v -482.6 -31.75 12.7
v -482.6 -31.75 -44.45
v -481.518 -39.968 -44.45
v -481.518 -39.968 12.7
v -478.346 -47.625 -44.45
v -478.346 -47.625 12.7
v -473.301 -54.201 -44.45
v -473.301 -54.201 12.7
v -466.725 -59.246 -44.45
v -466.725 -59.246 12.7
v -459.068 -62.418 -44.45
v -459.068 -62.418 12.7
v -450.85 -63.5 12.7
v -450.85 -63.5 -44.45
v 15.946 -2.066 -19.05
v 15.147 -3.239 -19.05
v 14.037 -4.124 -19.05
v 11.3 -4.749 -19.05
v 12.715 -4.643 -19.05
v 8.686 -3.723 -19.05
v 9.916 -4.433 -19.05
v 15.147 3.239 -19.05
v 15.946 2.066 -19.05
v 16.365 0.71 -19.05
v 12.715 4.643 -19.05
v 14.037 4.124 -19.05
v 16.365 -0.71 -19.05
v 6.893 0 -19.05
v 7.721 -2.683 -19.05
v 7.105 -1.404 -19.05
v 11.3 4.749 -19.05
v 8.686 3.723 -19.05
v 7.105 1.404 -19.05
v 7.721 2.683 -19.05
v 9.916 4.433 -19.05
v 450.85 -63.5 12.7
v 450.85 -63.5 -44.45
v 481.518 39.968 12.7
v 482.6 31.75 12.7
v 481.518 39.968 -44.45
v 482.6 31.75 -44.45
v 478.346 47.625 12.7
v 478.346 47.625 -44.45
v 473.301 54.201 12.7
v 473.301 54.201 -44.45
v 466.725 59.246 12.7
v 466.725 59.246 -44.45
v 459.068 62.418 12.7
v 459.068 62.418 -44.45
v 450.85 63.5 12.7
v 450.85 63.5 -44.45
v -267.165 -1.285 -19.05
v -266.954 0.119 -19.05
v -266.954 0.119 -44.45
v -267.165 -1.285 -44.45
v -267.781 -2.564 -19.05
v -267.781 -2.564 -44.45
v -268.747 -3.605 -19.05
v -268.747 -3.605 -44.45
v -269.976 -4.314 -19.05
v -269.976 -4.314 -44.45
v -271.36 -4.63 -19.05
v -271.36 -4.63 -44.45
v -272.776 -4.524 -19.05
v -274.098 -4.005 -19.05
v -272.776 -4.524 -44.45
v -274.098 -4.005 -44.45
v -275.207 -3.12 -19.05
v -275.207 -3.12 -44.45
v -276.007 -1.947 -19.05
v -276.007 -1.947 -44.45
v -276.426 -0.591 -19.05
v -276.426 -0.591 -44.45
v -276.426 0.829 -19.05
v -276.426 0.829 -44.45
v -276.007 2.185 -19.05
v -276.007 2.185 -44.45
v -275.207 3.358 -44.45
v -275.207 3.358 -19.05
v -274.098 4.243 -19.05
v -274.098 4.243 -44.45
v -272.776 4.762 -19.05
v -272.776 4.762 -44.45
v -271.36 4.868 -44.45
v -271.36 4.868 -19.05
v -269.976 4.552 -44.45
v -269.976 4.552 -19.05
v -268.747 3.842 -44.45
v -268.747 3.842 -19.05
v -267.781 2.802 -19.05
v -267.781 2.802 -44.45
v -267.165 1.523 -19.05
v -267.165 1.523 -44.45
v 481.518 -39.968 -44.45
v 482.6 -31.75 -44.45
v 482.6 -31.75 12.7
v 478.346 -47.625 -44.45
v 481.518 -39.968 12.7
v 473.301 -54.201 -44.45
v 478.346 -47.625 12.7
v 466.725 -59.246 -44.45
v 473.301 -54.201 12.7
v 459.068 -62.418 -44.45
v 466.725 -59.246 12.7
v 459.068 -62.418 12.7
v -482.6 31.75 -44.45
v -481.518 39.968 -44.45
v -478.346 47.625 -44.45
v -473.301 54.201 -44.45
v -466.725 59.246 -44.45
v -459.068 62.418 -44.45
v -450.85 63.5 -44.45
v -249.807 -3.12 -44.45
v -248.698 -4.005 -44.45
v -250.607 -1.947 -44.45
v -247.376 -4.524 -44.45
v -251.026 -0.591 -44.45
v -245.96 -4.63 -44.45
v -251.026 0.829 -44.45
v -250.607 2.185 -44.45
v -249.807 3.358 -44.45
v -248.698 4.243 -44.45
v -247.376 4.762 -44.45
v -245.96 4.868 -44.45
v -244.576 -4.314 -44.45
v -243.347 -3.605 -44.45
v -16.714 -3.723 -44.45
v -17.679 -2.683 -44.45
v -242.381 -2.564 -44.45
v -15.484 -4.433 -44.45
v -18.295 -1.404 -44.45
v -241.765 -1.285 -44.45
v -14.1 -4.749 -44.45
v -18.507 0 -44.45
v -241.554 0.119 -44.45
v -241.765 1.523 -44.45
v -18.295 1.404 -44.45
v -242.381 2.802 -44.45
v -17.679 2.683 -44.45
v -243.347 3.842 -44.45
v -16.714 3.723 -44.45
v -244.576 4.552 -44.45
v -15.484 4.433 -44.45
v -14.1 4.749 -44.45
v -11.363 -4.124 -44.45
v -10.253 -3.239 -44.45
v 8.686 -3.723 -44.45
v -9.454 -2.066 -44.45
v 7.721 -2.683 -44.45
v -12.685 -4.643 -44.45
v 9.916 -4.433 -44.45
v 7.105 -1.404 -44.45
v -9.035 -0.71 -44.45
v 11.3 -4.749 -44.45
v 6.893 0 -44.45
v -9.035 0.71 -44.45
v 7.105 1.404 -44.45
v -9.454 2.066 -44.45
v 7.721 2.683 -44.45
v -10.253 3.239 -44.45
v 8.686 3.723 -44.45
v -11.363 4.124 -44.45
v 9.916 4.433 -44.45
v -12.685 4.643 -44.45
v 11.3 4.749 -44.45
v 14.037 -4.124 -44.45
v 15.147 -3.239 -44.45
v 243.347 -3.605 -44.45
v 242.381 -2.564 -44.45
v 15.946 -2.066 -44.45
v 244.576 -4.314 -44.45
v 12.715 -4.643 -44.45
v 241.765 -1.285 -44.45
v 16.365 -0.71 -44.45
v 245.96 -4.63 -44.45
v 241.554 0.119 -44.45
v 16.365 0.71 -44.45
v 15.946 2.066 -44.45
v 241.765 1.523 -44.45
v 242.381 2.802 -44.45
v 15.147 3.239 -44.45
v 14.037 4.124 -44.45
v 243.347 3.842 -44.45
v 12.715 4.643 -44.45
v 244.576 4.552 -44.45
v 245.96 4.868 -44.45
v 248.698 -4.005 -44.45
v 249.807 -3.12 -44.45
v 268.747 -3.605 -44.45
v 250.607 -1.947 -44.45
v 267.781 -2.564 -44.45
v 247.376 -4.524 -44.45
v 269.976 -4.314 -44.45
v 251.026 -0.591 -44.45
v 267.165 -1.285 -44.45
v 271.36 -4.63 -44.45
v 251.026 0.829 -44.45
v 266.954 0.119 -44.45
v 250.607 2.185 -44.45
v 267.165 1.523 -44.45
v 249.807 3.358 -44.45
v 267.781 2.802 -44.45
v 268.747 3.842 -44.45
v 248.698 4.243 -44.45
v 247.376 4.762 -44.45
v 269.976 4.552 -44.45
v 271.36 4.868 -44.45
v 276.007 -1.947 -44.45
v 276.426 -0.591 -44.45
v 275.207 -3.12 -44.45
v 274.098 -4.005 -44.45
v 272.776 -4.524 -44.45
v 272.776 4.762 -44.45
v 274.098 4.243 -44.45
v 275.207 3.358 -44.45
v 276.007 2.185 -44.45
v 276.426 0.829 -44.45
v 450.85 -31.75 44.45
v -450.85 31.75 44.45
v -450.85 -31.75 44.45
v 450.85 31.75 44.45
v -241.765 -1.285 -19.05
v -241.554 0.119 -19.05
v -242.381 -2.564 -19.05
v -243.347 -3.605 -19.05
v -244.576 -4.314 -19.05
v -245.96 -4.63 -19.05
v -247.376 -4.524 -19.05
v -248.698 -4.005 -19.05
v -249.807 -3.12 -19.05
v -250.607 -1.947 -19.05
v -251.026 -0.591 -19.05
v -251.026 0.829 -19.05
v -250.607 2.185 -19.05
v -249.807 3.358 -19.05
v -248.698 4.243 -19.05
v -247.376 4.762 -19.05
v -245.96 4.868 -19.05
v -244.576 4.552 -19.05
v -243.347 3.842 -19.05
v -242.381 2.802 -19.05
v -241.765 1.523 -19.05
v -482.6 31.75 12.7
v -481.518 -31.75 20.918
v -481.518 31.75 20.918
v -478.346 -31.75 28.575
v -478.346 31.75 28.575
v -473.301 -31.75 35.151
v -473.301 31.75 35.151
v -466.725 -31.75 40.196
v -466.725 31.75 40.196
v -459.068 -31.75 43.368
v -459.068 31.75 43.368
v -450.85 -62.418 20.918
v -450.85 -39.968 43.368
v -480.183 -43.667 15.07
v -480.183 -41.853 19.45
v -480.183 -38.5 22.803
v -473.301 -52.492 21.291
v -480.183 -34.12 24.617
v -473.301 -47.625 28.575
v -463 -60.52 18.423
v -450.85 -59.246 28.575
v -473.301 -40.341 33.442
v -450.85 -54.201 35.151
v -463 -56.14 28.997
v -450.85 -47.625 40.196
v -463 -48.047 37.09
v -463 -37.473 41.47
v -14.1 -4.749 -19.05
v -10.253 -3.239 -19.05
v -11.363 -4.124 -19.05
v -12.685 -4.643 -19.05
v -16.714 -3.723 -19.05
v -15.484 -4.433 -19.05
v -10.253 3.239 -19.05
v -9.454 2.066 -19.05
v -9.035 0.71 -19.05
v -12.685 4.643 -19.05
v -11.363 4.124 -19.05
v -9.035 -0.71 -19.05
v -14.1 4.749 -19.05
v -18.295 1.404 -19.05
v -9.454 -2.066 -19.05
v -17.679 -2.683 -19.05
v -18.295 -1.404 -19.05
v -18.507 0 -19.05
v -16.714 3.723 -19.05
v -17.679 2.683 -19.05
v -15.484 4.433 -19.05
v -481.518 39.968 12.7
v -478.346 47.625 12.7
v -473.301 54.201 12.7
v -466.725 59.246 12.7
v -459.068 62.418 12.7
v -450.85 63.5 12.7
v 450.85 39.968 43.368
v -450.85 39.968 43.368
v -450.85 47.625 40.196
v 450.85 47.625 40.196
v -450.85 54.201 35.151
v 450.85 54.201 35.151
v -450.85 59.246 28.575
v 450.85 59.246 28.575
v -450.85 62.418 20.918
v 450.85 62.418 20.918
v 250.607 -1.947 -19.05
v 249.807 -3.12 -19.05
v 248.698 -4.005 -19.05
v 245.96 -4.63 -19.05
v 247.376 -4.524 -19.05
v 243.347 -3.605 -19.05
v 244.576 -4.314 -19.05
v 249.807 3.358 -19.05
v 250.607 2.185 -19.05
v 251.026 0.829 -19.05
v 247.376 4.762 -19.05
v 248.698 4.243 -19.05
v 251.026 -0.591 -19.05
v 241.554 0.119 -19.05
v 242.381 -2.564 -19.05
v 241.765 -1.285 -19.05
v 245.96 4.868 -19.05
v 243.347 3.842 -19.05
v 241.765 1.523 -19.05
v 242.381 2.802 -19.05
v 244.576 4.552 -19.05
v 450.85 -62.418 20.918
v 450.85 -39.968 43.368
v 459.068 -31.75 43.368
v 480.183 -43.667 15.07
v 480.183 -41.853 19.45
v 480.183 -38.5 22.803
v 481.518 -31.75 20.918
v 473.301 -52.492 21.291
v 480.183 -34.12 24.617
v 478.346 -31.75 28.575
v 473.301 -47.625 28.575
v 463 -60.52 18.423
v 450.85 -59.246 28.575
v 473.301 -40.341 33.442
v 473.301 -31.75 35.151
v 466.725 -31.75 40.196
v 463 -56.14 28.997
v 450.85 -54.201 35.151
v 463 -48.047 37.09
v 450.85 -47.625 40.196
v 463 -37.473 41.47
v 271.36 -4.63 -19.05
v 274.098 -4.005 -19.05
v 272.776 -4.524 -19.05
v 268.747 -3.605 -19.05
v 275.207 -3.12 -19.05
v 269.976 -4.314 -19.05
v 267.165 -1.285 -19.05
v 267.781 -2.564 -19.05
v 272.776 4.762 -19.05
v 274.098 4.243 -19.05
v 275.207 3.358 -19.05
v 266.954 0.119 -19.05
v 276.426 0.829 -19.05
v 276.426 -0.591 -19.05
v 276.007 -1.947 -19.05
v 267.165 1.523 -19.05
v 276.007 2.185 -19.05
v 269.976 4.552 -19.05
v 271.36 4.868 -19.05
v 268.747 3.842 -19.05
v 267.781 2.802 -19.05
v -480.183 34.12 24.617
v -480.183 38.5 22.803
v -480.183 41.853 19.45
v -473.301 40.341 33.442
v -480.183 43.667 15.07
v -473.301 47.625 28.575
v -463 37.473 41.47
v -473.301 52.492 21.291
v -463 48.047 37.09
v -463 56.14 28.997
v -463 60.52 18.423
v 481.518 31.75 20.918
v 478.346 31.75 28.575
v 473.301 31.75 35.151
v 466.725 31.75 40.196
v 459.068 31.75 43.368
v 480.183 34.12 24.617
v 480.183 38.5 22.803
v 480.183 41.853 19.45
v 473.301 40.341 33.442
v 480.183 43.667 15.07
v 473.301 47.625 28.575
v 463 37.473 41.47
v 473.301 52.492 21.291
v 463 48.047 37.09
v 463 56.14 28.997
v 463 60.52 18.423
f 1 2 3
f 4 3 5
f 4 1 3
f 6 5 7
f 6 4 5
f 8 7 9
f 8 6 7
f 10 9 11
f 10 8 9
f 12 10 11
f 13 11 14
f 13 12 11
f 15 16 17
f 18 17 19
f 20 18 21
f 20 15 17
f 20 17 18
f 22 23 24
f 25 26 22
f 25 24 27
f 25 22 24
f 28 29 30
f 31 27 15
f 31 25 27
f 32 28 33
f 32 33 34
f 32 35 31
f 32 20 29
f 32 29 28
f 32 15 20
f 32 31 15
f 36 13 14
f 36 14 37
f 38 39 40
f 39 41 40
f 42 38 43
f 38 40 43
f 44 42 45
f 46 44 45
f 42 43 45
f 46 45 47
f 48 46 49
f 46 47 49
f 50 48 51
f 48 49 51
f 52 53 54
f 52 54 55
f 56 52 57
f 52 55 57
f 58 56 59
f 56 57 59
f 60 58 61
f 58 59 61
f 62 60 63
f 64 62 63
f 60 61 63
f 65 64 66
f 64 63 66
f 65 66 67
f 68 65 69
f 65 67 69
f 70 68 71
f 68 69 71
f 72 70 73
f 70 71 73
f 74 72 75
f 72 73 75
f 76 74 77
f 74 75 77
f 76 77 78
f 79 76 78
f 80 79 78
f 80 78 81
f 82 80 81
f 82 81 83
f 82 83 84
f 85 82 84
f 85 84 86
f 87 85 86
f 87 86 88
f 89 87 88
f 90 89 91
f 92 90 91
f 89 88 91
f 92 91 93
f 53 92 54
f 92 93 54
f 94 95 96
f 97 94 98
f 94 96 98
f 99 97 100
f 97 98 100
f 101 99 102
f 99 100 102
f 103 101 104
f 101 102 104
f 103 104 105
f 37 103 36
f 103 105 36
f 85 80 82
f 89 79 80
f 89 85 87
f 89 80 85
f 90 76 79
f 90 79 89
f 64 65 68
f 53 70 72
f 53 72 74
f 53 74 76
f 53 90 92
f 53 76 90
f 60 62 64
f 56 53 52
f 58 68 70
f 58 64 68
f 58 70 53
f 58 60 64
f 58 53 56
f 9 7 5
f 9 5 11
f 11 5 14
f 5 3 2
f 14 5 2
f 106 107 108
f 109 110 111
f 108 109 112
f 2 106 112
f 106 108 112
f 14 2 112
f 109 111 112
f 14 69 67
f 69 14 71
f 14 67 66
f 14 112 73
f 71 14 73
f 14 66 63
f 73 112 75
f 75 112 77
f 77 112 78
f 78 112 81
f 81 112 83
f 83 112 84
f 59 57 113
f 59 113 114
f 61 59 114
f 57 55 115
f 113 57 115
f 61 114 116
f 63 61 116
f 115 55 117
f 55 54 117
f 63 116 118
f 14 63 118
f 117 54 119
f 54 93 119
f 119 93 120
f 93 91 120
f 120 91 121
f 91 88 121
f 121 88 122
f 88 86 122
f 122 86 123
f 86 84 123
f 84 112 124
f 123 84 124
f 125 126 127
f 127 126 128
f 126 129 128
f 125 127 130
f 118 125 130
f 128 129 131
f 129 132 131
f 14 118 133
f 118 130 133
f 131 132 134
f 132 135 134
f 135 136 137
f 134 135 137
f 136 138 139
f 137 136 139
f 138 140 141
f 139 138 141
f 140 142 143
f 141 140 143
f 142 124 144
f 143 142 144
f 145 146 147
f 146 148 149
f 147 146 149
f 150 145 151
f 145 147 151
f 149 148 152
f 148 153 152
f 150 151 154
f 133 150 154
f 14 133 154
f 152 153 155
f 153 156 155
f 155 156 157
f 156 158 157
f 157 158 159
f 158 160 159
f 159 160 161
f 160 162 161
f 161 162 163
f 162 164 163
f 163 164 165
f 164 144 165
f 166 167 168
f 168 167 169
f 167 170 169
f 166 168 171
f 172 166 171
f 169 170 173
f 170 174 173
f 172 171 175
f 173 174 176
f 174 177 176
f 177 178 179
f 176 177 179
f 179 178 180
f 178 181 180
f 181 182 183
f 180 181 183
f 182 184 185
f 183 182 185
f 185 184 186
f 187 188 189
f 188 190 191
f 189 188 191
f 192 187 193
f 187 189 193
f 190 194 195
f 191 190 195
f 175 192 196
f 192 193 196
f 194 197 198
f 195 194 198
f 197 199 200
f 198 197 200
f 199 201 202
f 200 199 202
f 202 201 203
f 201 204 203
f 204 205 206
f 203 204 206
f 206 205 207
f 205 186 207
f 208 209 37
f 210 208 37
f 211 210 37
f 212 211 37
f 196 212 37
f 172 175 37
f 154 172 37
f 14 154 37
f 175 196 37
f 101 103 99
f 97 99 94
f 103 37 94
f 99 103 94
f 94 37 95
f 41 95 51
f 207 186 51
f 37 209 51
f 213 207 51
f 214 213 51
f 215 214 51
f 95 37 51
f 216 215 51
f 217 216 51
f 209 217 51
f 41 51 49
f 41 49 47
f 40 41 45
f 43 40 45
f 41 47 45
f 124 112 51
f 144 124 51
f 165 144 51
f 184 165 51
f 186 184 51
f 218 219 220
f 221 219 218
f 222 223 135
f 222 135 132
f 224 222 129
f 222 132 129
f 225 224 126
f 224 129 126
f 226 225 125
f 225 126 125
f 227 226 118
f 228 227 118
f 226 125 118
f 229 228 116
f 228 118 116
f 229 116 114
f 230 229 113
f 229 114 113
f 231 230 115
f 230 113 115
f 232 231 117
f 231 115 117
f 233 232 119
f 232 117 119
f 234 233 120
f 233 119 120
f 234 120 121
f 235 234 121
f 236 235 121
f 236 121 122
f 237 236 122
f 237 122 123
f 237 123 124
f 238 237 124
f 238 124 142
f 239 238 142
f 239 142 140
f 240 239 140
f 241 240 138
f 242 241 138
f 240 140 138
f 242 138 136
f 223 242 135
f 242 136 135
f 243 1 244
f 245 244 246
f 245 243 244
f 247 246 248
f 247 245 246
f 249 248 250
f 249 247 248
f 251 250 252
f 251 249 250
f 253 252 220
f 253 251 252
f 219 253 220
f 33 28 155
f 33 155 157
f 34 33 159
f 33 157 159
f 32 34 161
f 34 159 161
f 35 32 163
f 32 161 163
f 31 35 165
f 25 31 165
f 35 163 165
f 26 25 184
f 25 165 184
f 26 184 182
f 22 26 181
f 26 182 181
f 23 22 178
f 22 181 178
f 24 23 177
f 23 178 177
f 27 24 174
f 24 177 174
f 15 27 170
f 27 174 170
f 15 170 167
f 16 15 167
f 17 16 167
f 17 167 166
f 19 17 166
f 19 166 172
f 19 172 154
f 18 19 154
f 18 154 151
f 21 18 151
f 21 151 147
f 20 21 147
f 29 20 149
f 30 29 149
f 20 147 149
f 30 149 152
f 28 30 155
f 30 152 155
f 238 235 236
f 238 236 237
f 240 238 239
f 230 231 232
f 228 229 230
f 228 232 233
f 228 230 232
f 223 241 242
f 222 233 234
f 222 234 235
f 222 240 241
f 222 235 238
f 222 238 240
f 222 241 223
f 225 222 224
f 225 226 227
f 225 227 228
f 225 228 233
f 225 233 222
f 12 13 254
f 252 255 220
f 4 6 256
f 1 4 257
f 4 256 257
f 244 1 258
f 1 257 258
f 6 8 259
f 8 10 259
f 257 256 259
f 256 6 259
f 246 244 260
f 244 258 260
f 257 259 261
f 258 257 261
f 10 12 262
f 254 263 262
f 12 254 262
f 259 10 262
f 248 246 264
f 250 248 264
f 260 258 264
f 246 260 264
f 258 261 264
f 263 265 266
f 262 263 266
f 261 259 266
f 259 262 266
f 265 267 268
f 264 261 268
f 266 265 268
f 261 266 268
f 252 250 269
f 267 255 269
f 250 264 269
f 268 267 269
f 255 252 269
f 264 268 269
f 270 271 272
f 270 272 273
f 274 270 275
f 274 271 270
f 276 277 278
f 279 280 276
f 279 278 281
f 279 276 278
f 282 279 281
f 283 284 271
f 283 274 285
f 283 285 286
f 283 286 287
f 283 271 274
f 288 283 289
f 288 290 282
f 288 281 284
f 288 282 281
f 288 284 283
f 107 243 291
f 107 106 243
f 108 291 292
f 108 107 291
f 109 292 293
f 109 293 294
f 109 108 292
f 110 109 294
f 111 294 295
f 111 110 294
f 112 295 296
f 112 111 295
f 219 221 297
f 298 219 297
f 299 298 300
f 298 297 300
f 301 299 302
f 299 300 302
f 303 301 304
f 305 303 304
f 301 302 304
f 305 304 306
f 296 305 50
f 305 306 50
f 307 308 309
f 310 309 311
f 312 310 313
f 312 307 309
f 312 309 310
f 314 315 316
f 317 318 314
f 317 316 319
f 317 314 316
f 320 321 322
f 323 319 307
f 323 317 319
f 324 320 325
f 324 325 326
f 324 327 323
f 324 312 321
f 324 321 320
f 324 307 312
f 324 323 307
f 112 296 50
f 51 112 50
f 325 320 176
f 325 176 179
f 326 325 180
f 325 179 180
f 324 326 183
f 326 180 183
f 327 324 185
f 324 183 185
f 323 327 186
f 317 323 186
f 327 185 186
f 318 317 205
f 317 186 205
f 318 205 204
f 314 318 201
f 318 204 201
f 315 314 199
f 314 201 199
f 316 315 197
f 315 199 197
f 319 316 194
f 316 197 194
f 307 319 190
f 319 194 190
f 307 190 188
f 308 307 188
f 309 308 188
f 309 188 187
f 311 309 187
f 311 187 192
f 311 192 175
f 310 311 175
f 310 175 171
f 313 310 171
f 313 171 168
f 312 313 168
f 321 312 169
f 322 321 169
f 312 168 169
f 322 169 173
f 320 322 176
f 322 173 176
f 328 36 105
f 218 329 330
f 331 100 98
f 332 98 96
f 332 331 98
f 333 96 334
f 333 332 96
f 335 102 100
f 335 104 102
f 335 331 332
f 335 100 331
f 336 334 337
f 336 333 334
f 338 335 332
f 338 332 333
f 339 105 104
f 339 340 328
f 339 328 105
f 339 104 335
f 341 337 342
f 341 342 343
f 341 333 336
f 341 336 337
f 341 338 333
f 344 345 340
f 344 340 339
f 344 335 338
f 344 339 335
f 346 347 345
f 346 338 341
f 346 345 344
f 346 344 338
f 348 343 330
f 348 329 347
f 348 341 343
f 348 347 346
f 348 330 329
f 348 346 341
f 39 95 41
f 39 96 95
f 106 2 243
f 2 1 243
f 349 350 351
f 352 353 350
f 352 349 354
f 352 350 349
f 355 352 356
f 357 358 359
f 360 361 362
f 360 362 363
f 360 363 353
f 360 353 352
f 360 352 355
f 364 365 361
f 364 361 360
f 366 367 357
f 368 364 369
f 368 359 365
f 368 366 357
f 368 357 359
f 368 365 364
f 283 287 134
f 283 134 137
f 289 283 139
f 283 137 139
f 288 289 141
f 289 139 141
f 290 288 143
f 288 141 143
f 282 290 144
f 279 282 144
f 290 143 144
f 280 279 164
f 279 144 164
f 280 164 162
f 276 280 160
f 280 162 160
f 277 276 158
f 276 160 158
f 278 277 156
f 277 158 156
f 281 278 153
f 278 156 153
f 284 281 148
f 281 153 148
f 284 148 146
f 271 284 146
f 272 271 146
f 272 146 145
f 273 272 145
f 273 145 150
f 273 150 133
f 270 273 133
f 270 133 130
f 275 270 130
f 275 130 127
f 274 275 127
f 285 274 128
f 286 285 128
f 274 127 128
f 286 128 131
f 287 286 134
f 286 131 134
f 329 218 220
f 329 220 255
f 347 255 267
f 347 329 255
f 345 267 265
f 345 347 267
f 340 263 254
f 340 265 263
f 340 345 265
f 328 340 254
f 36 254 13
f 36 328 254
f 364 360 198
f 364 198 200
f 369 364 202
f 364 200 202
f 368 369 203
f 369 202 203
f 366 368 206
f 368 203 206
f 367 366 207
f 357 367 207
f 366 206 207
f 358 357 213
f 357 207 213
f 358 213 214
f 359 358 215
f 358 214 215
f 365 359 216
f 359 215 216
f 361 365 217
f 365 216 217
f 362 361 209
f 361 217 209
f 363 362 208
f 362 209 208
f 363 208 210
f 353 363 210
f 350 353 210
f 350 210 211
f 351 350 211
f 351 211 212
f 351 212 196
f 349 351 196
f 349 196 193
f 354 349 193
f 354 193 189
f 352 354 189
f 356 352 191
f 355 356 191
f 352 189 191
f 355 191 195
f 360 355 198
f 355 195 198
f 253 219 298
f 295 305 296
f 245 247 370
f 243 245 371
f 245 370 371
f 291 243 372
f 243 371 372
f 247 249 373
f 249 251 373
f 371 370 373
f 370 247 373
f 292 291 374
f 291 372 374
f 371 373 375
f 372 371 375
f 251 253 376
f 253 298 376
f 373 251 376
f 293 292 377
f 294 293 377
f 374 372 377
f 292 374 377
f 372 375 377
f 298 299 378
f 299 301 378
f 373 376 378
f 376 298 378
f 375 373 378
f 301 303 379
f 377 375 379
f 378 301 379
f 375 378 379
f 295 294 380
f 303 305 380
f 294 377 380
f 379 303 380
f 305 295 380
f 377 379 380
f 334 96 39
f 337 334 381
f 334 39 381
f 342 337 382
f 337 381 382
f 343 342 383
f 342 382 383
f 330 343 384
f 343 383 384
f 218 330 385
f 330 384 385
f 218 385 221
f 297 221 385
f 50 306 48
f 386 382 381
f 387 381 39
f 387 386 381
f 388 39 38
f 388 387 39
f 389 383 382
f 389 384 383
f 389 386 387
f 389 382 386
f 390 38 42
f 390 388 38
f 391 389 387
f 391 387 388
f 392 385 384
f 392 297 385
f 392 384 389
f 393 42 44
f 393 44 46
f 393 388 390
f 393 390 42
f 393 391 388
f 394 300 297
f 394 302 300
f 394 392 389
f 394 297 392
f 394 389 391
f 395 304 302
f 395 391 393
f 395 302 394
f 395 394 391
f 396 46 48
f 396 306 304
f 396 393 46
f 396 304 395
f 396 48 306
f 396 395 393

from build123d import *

# Parameters (mm, degrees)
SKETCH1_W           = 965.2
SKETCH1_H           = 127
BOSS_EXTRUDE1_DEPTH = 44.45
FILLET1_R           = 31.75
FILLET2_R           = 31.75
FILLET3_R           = 31.75
SKETCH6_R           = 4.7625
CUT_EXTRUDE1_DEPTH  = 25.4


with BuildPart() as part:
    # Sketch1 → Boss-Extrude1 (new, symmetric)
    with BuildSketch(Plane.XY):
        Rectangle(SKETCH1_W, SKETCH1_H)
    extrude(amount=BOSS_EXTRUDE1_DEPTH, both=True)

    # Fillet1
    fillet1_edges = [part.edges().sort_by_distance(p)[0] for p in [
        (0, -63.5, 44.45),
        (0, 63.5, 44.45),
    ]]
    fillet(fillet1_edges, radius=FILLET1_R)

    # Fillet2
    fillet2_edges = [part.edges().sort_by_distance(p)[0] for p in [
        (-482.6, 0, 44.45),
        (-482.6, -63.5, -15.875),
        (-482.6, 63.5, -15.875),
        (-482.6, 54.200640303, 35.150640303),
        (-482.6, -54.200640303, 35.150640303),
    ]]
    fillet(fillet2_edges, radius=FILLET2_R)

    # Fillet3
    fillet3_edges = [part.edges().sort_by_distance(p)[0] for p in [
        (482.6, 0, 44.45),
        (482.6, 63.5, -15.875),
        (482.6, -63.5, -15.875),
        (482.6, 54.200640303, 35.150640303),
        (482.6, -54.200640303, 35.150640303),
    ]]
    fillet(fillet3_edges, radius=FILLET3_R)

    # Sketch6 → Cut-Extrude1 (cut)
    with BuildSketch(Plane(origin=(0, 0, -44.45), x_dir=(-1, 0, 0), z_dir=(0, 0, -1))):
        with Locations((-11.655611638, 0)):
            Circle(SKETCH6_R)
        with Locations((13.744388362, 0)):
            Circle(SKETCH6_R)
        with Locations((-271.716271796, 0.118953538)):
            Circle(SKETCH6_R)
        with Locations((-246.316271796, 0.118953538)):
            Circle(SKETCH6_R)
        with Locations(Location((246.316271796, 0.118953538, 0), (0, 0, 180))):
            Circle(SKETCH6_R)
        with Locations(Location((271.716271796, 0.118953538, 0), (0, 0, 180))):
            Circle(SKETCH6_R)
    extrude(amount=-CUT_EXTRUDE1_DEPTH, mode=Mode.SUBTRACT)


solid = part.part
